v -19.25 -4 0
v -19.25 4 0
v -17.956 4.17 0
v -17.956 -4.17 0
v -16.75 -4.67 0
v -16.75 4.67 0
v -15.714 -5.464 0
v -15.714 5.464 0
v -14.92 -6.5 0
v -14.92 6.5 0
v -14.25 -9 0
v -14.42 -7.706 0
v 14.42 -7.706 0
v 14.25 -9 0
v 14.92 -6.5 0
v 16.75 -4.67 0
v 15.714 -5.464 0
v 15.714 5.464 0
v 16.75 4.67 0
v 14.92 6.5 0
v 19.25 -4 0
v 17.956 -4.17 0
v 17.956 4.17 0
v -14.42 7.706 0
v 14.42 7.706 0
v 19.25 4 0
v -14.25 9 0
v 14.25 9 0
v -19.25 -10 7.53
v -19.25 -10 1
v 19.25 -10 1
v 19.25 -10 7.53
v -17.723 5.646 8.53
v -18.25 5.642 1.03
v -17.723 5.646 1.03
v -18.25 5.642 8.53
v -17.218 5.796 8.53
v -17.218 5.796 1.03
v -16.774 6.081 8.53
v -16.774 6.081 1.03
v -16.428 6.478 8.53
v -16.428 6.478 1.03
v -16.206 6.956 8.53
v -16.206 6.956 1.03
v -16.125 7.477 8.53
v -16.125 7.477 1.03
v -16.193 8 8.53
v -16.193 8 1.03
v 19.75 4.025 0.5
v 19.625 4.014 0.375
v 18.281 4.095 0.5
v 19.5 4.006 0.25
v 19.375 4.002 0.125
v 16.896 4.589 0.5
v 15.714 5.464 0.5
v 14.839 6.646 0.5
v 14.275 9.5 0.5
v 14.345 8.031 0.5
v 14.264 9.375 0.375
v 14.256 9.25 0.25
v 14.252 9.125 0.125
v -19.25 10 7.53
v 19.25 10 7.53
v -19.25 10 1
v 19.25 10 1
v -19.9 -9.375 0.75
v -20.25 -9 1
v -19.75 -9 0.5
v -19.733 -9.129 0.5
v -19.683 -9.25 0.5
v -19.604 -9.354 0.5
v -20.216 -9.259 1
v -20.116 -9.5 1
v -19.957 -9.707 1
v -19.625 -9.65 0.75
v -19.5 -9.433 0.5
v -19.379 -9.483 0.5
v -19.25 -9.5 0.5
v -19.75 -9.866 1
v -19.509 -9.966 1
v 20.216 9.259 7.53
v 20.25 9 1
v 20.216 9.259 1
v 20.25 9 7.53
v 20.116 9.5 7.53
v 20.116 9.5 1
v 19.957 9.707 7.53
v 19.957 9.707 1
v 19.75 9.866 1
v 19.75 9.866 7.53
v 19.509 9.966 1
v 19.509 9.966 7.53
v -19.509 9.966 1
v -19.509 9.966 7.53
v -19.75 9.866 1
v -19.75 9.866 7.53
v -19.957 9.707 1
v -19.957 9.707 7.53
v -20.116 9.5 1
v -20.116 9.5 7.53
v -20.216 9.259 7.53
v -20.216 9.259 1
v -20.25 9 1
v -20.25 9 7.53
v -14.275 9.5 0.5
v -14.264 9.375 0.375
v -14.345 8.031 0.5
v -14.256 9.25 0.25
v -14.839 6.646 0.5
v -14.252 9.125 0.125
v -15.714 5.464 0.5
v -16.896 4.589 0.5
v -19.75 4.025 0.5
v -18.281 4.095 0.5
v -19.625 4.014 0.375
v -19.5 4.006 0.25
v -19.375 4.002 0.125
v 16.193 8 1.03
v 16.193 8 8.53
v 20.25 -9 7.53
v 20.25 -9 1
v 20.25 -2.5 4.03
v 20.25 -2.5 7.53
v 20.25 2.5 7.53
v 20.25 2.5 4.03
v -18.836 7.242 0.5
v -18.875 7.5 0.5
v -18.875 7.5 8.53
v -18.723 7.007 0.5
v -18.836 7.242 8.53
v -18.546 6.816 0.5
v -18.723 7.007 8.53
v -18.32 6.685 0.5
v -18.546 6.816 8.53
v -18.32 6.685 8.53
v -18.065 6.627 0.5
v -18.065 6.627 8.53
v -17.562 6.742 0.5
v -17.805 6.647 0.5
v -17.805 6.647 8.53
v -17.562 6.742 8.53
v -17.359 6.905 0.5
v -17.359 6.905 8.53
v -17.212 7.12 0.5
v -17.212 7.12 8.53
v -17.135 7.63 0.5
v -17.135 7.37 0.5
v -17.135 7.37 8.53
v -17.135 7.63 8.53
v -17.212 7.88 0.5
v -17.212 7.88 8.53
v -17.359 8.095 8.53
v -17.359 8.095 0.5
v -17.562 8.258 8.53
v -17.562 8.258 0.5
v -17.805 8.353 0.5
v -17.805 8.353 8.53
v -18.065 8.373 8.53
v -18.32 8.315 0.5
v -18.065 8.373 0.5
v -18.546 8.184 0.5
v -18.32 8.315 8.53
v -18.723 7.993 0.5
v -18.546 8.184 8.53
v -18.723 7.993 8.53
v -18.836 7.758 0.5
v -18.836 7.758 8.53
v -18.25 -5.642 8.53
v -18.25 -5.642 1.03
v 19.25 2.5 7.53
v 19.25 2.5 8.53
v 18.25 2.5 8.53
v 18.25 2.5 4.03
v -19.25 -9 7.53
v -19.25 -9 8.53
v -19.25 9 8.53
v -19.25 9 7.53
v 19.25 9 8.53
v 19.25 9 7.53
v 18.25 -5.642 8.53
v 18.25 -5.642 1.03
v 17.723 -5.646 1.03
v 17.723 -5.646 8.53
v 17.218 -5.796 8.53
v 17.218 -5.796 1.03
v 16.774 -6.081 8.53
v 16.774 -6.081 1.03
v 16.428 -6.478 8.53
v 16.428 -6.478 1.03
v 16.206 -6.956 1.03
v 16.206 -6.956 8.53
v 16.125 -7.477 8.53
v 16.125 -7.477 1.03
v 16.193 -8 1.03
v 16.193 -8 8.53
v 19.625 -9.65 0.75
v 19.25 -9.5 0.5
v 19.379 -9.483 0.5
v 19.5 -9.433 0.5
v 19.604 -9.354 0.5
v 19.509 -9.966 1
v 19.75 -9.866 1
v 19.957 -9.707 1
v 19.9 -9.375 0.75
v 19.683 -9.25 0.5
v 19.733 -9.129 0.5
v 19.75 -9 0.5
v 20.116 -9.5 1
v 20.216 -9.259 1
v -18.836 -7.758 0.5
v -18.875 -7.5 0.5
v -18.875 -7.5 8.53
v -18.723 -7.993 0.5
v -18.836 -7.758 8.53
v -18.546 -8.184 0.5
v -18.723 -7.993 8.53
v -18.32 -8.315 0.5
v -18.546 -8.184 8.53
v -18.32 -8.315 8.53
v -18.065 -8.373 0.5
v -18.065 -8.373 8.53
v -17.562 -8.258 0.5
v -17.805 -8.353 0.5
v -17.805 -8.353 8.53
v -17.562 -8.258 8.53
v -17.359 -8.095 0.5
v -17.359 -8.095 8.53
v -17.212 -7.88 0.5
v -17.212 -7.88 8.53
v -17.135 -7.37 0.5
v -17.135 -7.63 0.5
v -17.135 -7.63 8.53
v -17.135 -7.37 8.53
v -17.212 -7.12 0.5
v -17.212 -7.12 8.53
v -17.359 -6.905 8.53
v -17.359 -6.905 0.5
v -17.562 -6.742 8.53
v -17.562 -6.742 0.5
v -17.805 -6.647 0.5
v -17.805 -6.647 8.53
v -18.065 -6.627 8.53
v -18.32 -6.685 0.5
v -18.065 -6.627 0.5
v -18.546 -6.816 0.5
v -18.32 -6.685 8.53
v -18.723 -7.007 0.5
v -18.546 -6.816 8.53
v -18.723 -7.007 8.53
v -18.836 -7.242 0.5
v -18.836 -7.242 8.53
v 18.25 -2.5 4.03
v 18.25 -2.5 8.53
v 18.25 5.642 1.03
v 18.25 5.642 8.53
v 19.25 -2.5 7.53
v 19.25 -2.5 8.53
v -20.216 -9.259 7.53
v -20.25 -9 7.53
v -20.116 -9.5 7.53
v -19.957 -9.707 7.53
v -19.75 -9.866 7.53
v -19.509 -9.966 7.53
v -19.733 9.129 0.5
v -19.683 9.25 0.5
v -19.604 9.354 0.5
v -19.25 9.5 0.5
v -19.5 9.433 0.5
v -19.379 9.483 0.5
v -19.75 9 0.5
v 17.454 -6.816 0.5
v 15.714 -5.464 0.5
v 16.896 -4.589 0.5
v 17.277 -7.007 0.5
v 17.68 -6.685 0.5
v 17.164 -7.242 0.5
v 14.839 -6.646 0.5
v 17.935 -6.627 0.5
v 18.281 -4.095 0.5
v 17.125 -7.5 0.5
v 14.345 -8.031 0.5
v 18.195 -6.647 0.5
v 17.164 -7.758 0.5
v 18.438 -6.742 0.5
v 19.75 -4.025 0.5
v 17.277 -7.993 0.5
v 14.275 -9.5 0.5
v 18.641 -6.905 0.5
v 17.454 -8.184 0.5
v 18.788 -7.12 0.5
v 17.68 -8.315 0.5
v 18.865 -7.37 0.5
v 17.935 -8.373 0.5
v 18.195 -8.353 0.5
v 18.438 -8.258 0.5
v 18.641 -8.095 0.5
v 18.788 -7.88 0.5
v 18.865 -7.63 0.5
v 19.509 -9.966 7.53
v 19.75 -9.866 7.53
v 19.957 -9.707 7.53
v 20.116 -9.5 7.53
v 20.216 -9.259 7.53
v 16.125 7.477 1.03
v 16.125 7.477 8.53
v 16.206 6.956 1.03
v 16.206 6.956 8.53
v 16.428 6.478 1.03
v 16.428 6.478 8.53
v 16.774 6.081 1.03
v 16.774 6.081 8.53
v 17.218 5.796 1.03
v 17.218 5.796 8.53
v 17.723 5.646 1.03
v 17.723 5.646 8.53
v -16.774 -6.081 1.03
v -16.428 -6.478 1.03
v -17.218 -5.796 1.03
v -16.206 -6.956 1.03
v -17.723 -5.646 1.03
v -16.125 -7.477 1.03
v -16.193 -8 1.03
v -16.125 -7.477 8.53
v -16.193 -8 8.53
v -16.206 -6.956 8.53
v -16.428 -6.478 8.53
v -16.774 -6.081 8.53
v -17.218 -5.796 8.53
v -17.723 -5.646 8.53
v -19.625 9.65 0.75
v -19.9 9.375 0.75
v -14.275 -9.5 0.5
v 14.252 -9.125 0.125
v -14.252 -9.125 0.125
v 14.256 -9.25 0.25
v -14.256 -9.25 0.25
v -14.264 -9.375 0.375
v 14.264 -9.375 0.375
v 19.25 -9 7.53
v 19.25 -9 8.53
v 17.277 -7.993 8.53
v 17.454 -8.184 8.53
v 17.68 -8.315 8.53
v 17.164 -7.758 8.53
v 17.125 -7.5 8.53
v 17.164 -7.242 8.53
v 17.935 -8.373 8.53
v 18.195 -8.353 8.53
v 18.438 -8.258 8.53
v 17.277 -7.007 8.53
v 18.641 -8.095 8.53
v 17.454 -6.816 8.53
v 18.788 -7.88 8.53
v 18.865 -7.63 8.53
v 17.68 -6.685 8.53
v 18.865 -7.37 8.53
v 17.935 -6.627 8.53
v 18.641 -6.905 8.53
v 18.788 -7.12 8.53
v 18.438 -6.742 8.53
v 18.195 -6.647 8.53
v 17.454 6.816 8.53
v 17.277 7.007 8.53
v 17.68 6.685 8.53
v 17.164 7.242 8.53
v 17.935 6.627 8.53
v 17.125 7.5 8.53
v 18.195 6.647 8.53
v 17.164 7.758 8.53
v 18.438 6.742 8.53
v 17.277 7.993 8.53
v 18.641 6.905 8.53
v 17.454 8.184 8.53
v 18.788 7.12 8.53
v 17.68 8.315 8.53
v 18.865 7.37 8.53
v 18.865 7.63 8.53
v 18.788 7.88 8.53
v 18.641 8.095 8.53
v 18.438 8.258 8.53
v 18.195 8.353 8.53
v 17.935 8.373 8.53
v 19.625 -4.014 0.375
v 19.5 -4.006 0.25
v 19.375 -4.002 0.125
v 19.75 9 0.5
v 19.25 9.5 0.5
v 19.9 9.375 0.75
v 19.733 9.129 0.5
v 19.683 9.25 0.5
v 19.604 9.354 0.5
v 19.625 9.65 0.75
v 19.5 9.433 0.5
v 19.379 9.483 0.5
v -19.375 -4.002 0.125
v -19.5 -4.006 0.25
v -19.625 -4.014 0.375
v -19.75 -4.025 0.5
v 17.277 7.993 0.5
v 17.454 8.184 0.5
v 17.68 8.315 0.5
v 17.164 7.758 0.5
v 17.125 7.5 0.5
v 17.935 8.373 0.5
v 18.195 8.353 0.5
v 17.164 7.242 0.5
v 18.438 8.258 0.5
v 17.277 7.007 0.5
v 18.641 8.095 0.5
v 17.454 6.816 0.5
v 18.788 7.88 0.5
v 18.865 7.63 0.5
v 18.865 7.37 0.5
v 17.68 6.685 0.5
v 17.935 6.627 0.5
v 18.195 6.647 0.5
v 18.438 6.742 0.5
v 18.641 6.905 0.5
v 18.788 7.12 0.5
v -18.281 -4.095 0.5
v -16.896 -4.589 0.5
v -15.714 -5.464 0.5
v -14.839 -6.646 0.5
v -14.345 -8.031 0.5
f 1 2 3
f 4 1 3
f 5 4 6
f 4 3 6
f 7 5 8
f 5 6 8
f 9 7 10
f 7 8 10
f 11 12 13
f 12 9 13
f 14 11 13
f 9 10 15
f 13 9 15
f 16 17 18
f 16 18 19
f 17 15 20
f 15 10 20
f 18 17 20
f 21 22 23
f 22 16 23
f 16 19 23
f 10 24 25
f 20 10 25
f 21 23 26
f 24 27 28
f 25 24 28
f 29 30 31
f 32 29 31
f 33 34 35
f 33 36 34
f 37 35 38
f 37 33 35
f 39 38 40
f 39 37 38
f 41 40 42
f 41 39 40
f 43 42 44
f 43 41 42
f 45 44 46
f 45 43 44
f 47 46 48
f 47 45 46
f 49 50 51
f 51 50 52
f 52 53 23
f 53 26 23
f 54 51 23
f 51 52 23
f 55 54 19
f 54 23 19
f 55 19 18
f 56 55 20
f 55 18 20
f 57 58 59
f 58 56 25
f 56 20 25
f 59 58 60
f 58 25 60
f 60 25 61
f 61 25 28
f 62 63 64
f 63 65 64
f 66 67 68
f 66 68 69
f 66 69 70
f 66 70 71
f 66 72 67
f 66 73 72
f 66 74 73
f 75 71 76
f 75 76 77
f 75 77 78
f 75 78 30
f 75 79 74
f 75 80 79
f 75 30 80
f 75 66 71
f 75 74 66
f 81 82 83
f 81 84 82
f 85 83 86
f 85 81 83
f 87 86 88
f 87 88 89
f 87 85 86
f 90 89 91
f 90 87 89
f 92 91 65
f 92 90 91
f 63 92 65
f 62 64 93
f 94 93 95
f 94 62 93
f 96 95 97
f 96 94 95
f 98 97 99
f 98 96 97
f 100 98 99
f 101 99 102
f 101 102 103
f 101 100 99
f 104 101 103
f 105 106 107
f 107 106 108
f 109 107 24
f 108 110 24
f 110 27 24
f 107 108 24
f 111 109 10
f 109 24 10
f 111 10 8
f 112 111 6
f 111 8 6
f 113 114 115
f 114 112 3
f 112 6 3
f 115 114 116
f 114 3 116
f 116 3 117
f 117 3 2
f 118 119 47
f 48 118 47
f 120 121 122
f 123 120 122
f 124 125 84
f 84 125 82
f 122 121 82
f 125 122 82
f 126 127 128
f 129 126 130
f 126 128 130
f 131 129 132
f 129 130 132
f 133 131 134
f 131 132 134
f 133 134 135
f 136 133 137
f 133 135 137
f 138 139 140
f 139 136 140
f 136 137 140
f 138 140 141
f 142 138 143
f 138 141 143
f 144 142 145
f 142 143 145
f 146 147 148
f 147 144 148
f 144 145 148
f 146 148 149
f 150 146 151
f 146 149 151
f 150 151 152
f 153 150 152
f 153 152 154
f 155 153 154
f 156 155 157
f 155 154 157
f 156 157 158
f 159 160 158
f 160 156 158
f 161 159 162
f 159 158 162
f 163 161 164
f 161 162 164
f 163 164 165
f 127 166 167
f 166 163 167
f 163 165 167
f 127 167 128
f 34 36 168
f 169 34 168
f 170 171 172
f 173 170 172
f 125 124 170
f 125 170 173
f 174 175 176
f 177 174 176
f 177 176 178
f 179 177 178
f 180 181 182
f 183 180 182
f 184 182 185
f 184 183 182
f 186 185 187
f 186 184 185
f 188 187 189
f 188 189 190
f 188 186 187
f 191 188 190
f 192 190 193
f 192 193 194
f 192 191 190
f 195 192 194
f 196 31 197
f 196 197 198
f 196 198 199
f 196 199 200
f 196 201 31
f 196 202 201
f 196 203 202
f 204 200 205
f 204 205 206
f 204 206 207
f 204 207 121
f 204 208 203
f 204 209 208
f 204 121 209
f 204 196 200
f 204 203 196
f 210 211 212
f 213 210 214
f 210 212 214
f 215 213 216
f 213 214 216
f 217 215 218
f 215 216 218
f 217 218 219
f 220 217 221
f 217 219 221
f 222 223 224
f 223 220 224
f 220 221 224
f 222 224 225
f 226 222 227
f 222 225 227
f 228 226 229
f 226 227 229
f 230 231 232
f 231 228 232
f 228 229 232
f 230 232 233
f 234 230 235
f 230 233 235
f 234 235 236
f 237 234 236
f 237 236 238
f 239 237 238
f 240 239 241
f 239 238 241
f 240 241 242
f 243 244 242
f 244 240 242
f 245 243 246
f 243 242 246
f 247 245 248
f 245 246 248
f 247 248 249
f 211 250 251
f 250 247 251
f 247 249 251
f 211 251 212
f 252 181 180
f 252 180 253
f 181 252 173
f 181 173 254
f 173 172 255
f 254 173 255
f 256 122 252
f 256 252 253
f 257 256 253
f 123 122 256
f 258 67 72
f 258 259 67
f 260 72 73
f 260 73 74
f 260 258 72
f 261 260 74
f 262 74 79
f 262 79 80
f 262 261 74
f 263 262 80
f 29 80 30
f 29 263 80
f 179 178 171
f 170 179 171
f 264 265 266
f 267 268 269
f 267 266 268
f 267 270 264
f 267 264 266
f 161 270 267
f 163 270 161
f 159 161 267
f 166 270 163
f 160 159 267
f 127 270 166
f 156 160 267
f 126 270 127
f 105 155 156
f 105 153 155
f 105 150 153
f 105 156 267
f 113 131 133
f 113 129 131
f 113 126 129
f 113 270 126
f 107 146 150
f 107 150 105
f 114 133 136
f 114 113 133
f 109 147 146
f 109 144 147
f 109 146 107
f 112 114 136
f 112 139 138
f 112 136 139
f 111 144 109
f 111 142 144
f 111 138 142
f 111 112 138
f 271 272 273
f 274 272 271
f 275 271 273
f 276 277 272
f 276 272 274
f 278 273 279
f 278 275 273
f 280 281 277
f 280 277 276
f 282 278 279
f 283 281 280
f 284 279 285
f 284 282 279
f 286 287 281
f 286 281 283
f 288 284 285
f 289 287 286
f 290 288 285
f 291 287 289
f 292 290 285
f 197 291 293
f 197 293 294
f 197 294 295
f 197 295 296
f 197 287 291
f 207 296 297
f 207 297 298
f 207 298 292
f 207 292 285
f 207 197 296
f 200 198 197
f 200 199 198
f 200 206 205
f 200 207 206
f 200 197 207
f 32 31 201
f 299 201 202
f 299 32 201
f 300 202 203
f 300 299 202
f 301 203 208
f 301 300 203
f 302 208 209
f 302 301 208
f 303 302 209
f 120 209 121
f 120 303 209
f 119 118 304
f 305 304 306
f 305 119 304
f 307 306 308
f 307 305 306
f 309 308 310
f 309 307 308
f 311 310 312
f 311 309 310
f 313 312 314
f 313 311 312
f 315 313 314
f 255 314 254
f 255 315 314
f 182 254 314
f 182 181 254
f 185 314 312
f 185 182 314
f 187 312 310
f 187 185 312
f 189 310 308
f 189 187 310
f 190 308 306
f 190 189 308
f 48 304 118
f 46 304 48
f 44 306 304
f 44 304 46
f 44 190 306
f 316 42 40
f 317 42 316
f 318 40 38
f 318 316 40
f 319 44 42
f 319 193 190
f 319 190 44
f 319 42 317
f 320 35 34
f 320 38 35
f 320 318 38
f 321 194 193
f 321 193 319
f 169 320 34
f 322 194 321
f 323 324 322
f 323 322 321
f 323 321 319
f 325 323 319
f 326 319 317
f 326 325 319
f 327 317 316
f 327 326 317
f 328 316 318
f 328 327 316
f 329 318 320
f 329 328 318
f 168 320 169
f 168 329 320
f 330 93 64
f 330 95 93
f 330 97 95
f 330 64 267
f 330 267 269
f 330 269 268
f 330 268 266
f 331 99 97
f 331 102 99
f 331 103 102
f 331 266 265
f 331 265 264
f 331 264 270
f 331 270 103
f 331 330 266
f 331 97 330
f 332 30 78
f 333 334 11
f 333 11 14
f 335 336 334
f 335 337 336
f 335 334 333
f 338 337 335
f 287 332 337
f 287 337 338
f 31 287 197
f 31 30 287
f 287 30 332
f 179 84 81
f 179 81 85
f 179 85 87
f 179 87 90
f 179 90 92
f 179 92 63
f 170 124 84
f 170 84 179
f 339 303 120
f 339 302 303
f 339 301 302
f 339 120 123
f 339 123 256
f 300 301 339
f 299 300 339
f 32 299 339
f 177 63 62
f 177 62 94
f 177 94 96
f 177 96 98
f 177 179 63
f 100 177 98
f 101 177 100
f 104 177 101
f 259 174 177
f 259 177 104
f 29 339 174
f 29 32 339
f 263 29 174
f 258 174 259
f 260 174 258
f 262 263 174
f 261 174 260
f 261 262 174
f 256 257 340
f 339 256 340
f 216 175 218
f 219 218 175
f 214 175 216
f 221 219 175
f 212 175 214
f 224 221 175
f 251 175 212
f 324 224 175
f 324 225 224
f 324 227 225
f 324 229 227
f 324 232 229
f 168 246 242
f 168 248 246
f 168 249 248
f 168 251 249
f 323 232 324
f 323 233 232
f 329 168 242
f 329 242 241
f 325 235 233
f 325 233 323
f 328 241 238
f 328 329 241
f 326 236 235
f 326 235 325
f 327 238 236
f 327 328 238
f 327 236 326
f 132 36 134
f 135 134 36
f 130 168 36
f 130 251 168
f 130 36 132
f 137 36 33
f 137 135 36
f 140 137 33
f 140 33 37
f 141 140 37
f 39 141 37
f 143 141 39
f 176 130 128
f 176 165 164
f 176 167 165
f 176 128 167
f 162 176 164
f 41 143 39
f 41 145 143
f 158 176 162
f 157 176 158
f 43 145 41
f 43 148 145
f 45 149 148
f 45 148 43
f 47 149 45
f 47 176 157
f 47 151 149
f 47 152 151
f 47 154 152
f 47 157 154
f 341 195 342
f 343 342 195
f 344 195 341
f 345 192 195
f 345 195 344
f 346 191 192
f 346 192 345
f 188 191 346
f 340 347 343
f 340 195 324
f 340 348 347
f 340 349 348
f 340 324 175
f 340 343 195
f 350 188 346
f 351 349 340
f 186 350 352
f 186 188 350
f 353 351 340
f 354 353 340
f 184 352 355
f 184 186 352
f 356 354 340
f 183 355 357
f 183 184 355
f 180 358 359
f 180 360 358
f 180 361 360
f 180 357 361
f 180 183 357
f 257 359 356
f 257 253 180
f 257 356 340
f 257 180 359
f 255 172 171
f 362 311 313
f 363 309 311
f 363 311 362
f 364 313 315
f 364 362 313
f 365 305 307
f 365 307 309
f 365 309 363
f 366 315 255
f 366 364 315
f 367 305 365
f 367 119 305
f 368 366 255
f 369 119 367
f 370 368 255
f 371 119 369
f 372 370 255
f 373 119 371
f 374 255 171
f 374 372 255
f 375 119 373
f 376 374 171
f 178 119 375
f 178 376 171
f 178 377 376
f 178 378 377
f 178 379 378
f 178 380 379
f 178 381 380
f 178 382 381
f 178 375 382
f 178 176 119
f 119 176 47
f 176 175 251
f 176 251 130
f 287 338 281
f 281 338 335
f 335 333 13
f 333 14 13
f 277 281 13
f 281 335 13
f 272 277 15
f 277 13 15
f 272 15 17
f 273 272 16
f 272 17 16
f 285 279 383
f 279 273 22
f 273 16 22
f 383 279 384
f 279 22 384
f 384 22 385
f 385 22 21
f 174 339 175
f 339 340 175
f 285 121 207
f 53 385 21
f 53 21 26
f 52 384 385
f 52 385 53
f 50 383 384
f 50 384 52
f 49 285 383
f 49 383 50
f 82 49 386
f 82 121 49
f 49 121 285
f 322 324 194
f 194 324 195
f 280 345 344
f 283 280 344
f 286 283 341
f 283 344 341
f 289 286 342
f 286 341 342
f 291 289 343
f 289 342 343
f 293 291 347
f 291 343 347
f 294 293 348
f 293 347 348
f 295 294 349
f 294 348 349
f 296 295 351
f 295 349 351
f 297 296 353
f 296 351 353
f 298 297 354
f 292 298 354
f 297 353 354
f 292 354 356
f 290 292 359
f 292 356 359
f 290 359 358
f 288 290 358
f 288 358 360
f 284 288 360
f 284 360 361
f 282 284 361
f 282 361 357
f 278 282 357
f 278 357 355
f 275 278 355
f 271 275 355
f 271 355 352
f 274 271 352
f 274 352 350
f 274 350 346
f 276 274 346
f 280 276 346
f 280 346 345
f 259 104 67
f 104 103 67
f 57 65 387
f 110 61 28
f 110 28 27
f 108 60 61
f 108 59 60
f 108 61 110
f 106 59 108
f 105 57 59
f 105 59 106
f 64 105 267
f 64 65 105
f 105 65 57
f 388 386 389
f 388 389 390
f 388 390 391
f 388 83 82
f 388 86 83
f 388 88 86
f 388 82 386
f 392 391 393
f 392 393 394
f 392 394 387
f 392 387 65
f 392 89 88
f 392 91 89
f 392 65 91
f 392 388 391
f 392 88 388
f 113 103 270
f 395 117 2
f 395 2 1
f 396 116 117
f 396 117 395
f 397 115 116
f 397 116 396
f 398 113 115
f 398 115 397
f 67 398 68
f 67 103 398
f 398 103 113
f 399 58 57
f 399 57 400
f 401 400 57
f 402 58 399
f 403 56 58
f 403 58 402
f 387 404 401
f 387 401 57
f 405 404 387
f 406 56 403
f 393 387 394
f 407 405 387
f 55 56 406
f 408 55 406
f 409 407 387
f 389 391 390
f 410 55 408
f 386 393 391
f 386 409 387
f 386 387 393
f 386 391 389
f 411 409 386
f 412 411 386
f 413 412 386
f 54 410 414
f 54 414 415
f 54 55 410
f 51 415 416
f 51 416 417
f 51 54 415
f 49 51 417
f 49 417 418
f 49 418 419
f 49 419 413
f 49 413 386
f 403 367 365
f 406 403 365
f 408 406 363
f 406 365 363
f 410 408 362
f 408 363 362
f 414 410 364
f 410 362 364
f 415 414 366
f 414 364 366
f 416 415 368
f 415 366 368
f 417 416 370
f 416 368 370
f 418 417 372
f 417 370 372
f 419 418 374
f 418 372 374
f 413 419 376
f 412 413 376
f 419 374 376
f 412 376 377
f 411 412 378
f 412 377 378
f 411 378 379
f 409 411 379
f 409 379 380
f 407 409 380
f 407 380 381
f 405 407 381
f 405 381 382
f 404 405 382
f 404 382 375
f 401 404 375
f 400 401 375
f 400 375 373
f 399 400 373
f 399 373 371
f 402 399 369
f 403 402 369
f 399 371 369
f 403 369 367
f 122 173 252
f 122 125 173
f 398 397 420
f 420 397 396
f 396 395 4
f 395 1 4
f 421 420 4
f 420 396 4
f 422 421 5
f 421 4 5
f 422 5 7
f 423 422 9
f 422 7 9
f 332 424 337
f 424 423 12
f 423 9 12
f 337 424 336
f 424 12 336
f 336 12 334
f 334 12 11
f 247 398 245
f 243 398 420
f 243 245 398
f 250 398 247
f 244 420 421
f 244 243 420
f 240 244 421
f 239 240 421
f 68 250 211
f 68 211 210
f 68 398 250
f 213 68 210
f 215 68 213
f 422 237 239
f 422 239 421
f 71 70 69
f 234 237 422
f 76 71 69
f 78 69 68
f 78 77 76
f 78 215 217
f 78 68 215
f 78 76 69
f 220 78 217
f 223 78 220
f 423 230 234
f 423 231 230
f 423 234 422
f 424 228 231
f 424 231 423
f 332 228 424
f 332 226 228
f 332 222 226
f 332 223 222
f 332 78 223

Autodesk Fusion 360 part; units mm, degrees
sketch "Sketch1" plane through (0, 0, 0) normal (0, 0, 1) x (1, 0, 0)
  line L0 (20.25, 10) -> (-20.25, 10)
  line L1 (-20.25, 10) -> (-20.25, -10)
  line L2 (-20.25, -10) -> (20.25, -10)
  line L3 (20.25, -10) -> (20.25, 10)
  line L4 (20.25, 10) -> (-20.25, -10) construction
  line L5 (-20.25, 10) -> (20.25, -10) construction
  dimension "d1" = 40.5
  dimension "d2" = 20
extrude "Extrude1" add sketch "Sketch1" along normal blind 8.53
sketch "Sketch2" plane through (0, 0, 8.53) normal (0, 0, 1) x (-1, 0, 0)
  line L0 (-20.25, 10) -> (-20.25, -10)
  line L1 (-20.25, -10) -> (20.25, -10)
  line L2 (20.25, -10) -> (20.25, 10)
  line L3 (20.25, 10) -> (-20.25, 10)
  line L4 (-18, -7.5) -> (18, -7.5) construction
  line L5 (18, -7.5) -> (18, 7.5) construction
  line L6 (18, 7.5) -> (-18, 7.5) construction
  line L7 (-18, 7.5) -> (-18, -7.5) construction
  line L8 (-18, -7.5) -> (18, 7.5) construction
  line L9 (18, -7.5) -> (-18, 7.5) construction
  circle A0 centre (-18, -7.5) radius 0.875
  circle A1 centre (-18, 7.5) radius 0.875
  circle A2 centre (18, 7.5) radius 0.875
  circle A3 centre (18, -7.5) radius 0.875
  dimension "d6" = 15
  dimension "d7" = 36
  dimension "d8" = 1.75
extrude "Extrude2" cut sketch "Sketch2" against normal blind 15 contours A0 | A1 | A2 | A3
sketch "Sketch3" plane through (0, 0, 8.53) normal (0, 0, 1) x (-1, 0, 0)
  circle A0 centre (-18, -7.5) radius 0.875
  circle A1 centre (-18, 7.5) radius 0.875
  circle A2 centre (18, -7.5) radius 0.875
  circle A3 centre (18, 7.5) radius 0.875
  line L0 (-20.25, 10) -> (-20.25, -10)
  line L1 (-20.25, -10) -> (20.25, -10)
  line L2 (20.25, -10) -> (20.25, 10)
  line L3 (20.25, 10) -> (-20.25, 10)
  line L4 (-18.25, -8) -> (18.25, -8)
  line L5 (18.25, -8) -> (18.25, 8)
  line L6 (18.25, 8) -> (-18.25, 8)
  line L7 (-18.25, 8) -> (-18.25, -8)
  line L8 (-18.25, -8) -> (18.25, 8) construction
  line L9 (18.25, -8) -> (-18.25, 8) construction
  circle A4 centre (-18, -7.5) radius 1.875
  circle A5 centre (-18, 7.5) radius 1.875
  circle A6 centre (18, 7.5) radius 1.875
  circle A7 centre (18, -7.5) radius 1.875
  dimension "d11" = 2
  dimension "d13" = 2
  dimension "d14" = 3.75
extrude "Extrude3" cut sketch "Sketch3" against normal blind 7.5 contours L4 L5 L6 L7 A4 A5 A6 A7
sketch "Sketch4" plane through (20.25, 0, 0) normal (1, 0, 0) x (0, 1, 0)
  line L0 (-10, 0) -> (10, 0)
  line L1 (10, 0) -> (10, 8.53)
  line L2 (10, 8.53) -> (-10, 8.53)
  line L3 (-10, 8.53) -> (-10, 0)
  line L4 (-2.5, 8.53) -> (2.5, 8.53)
  line L5 (2.5, 8.53) -> (2.5, 4.03)
  line L6 (2.5, 4.03) -> (-2.5, 4.03)
  line L7 (-2.5, 4.03) -> (-2.5, 8.53)
  dimension "d17" = 5
  dimension "d18" = 4.5
  dimension "d19" = 2.5
extrude "Extrude4" cut sketch "Sketch4" against normal blind 3 contours L2 L4 L5 L6 L7
sketch "Sketch5" plane through (0, 0, 8.53) normal (0, 0, 1) x (-1, 0, 0)
  line L0 (-20.25, 2.5) -> (-18.25, 2.5)
  line L1 (-18.25, 2.5) -> (-18.25, 5.6417)
  arc A0 (-18.25, 5.6417) -> (-16.1929, 8) centre (-18, 7.5) ccw
  line L2 (-16.1929, 8) -> (16.1929, 8)
  arc A1 (16.1929, 8) -> (18.25, 5.6417) centre (18, 7.5) ccw
  line L3 (18.25, 5.6417) -> (18.25, -5.6417)
  arc A2 (18.25, -5.6417) -> (16.1929, -8) centre (18, -7.5) ccw
  line L4 (16.1929, -8) -> (-16.1929, -8)
  arc A3 (-16.1929, -8) -> (-18.25, -5.6417) centre (-18, -7.5) ccw
  line L5 (-18.25, -5.6417) -> (-18.25, -2.5)
  line L6 (-18.25, -2.5) -> (-20.25, -2.5)
  line L7 (-20.25, -2.5) -> (-20.25, -10)
  line L8 (-20.25, -10) -> (20.25, -10)
  line L9 (20.25, -10) -> (20.25, 10)
  line L10 (20.25, 10) -> (-20.25, 10)
  line L11 (-20.25, 10) -> (-20.25, 2.5)
  circle A4 centre (-18, -7.5) radius 0.875
  circle A5 centre (-18, 7.5) radius 0.875
  circle A6 centre (18, -7.5) radius 0.875
  circle A7 centre (18, 7.5) radius 0.875
  line L12 (19.25, -9) -> (-19.25, -9)
  line L13 (-19.25, -9) -> (-19.25, 9)
  line L14 (-19.25, 9) -> (19.25, 9)
  line L15 (19.25, 9) -> (19.25, -9)
  line L16 (19.25, -9) -> (-19.25, 9) construction
  line L17 (-19.25, -9) -> (19.25, 9) construction
  dimension "d22" = 1
  dimension "d23" = 1
extrude "Extrude5" cut sketch "Sketch5" against normal blind 1 contours L0 L6 L7 L8 L9 L10 L11 L12 L13 L14 L15
fillet "Fillet1" radius 1 4 edges at (-20.25, -10, 3.765) (-20.25, 10, 3.765) (20.25, -10, 3.765) (20.25, 10, 3.765)
chamfer "Chamfer1" distance 1 angle 45 8 edges at (0, 10, 0) (-19.9571, 9.7071, 0) (-20.25, 0, 0) (-19.9571, -9.7071, 0) (0, -10, 0) (19.9571, -9.7071, 0) (20.25, 0, 0) (19.9571, 9.7071, 0)
sketch "Sketch6" plane through (0, 0, 0) normal (0, 0, -1) x (1, 0, 0)
  circle A0 centre (-18, 7.5) radius 0.875
  circle A1 centre (-18, -7.5) radius 0.875
  circle A2 centre (18, 7.5) radius 0.875
  circle A3 centre (18, -7.5) radius 0.875
  line L0 (-19.25, -9) -> (19.25, -9)
  line L1 (19.25, -9) -> (19.25, 9)
  line L2 (19.25, 9) -> (-19.25, 9)
  line L3 (-19.25, 9) -> (-19.25, -9)
  circle A4 centre (-19.25, 9) radius 5
  circle A5 centre (19.25, 9) radius 5
  circle A6 centre (19.25, -9) radius 5
  circle A7 centre (-19.25, -9) radius 5
  dimension "d29" = 10
extrude "Extrude6" cut sketch "Sketch6" against normal blind 0.5 contours L0 L3 A7 | L0 L3 A7 | L0 L1 A6 | L0 L1 A6 | L2 L3 A4 | L2 L3 A4 | L1 L2 A5 | L1 L2 A5
